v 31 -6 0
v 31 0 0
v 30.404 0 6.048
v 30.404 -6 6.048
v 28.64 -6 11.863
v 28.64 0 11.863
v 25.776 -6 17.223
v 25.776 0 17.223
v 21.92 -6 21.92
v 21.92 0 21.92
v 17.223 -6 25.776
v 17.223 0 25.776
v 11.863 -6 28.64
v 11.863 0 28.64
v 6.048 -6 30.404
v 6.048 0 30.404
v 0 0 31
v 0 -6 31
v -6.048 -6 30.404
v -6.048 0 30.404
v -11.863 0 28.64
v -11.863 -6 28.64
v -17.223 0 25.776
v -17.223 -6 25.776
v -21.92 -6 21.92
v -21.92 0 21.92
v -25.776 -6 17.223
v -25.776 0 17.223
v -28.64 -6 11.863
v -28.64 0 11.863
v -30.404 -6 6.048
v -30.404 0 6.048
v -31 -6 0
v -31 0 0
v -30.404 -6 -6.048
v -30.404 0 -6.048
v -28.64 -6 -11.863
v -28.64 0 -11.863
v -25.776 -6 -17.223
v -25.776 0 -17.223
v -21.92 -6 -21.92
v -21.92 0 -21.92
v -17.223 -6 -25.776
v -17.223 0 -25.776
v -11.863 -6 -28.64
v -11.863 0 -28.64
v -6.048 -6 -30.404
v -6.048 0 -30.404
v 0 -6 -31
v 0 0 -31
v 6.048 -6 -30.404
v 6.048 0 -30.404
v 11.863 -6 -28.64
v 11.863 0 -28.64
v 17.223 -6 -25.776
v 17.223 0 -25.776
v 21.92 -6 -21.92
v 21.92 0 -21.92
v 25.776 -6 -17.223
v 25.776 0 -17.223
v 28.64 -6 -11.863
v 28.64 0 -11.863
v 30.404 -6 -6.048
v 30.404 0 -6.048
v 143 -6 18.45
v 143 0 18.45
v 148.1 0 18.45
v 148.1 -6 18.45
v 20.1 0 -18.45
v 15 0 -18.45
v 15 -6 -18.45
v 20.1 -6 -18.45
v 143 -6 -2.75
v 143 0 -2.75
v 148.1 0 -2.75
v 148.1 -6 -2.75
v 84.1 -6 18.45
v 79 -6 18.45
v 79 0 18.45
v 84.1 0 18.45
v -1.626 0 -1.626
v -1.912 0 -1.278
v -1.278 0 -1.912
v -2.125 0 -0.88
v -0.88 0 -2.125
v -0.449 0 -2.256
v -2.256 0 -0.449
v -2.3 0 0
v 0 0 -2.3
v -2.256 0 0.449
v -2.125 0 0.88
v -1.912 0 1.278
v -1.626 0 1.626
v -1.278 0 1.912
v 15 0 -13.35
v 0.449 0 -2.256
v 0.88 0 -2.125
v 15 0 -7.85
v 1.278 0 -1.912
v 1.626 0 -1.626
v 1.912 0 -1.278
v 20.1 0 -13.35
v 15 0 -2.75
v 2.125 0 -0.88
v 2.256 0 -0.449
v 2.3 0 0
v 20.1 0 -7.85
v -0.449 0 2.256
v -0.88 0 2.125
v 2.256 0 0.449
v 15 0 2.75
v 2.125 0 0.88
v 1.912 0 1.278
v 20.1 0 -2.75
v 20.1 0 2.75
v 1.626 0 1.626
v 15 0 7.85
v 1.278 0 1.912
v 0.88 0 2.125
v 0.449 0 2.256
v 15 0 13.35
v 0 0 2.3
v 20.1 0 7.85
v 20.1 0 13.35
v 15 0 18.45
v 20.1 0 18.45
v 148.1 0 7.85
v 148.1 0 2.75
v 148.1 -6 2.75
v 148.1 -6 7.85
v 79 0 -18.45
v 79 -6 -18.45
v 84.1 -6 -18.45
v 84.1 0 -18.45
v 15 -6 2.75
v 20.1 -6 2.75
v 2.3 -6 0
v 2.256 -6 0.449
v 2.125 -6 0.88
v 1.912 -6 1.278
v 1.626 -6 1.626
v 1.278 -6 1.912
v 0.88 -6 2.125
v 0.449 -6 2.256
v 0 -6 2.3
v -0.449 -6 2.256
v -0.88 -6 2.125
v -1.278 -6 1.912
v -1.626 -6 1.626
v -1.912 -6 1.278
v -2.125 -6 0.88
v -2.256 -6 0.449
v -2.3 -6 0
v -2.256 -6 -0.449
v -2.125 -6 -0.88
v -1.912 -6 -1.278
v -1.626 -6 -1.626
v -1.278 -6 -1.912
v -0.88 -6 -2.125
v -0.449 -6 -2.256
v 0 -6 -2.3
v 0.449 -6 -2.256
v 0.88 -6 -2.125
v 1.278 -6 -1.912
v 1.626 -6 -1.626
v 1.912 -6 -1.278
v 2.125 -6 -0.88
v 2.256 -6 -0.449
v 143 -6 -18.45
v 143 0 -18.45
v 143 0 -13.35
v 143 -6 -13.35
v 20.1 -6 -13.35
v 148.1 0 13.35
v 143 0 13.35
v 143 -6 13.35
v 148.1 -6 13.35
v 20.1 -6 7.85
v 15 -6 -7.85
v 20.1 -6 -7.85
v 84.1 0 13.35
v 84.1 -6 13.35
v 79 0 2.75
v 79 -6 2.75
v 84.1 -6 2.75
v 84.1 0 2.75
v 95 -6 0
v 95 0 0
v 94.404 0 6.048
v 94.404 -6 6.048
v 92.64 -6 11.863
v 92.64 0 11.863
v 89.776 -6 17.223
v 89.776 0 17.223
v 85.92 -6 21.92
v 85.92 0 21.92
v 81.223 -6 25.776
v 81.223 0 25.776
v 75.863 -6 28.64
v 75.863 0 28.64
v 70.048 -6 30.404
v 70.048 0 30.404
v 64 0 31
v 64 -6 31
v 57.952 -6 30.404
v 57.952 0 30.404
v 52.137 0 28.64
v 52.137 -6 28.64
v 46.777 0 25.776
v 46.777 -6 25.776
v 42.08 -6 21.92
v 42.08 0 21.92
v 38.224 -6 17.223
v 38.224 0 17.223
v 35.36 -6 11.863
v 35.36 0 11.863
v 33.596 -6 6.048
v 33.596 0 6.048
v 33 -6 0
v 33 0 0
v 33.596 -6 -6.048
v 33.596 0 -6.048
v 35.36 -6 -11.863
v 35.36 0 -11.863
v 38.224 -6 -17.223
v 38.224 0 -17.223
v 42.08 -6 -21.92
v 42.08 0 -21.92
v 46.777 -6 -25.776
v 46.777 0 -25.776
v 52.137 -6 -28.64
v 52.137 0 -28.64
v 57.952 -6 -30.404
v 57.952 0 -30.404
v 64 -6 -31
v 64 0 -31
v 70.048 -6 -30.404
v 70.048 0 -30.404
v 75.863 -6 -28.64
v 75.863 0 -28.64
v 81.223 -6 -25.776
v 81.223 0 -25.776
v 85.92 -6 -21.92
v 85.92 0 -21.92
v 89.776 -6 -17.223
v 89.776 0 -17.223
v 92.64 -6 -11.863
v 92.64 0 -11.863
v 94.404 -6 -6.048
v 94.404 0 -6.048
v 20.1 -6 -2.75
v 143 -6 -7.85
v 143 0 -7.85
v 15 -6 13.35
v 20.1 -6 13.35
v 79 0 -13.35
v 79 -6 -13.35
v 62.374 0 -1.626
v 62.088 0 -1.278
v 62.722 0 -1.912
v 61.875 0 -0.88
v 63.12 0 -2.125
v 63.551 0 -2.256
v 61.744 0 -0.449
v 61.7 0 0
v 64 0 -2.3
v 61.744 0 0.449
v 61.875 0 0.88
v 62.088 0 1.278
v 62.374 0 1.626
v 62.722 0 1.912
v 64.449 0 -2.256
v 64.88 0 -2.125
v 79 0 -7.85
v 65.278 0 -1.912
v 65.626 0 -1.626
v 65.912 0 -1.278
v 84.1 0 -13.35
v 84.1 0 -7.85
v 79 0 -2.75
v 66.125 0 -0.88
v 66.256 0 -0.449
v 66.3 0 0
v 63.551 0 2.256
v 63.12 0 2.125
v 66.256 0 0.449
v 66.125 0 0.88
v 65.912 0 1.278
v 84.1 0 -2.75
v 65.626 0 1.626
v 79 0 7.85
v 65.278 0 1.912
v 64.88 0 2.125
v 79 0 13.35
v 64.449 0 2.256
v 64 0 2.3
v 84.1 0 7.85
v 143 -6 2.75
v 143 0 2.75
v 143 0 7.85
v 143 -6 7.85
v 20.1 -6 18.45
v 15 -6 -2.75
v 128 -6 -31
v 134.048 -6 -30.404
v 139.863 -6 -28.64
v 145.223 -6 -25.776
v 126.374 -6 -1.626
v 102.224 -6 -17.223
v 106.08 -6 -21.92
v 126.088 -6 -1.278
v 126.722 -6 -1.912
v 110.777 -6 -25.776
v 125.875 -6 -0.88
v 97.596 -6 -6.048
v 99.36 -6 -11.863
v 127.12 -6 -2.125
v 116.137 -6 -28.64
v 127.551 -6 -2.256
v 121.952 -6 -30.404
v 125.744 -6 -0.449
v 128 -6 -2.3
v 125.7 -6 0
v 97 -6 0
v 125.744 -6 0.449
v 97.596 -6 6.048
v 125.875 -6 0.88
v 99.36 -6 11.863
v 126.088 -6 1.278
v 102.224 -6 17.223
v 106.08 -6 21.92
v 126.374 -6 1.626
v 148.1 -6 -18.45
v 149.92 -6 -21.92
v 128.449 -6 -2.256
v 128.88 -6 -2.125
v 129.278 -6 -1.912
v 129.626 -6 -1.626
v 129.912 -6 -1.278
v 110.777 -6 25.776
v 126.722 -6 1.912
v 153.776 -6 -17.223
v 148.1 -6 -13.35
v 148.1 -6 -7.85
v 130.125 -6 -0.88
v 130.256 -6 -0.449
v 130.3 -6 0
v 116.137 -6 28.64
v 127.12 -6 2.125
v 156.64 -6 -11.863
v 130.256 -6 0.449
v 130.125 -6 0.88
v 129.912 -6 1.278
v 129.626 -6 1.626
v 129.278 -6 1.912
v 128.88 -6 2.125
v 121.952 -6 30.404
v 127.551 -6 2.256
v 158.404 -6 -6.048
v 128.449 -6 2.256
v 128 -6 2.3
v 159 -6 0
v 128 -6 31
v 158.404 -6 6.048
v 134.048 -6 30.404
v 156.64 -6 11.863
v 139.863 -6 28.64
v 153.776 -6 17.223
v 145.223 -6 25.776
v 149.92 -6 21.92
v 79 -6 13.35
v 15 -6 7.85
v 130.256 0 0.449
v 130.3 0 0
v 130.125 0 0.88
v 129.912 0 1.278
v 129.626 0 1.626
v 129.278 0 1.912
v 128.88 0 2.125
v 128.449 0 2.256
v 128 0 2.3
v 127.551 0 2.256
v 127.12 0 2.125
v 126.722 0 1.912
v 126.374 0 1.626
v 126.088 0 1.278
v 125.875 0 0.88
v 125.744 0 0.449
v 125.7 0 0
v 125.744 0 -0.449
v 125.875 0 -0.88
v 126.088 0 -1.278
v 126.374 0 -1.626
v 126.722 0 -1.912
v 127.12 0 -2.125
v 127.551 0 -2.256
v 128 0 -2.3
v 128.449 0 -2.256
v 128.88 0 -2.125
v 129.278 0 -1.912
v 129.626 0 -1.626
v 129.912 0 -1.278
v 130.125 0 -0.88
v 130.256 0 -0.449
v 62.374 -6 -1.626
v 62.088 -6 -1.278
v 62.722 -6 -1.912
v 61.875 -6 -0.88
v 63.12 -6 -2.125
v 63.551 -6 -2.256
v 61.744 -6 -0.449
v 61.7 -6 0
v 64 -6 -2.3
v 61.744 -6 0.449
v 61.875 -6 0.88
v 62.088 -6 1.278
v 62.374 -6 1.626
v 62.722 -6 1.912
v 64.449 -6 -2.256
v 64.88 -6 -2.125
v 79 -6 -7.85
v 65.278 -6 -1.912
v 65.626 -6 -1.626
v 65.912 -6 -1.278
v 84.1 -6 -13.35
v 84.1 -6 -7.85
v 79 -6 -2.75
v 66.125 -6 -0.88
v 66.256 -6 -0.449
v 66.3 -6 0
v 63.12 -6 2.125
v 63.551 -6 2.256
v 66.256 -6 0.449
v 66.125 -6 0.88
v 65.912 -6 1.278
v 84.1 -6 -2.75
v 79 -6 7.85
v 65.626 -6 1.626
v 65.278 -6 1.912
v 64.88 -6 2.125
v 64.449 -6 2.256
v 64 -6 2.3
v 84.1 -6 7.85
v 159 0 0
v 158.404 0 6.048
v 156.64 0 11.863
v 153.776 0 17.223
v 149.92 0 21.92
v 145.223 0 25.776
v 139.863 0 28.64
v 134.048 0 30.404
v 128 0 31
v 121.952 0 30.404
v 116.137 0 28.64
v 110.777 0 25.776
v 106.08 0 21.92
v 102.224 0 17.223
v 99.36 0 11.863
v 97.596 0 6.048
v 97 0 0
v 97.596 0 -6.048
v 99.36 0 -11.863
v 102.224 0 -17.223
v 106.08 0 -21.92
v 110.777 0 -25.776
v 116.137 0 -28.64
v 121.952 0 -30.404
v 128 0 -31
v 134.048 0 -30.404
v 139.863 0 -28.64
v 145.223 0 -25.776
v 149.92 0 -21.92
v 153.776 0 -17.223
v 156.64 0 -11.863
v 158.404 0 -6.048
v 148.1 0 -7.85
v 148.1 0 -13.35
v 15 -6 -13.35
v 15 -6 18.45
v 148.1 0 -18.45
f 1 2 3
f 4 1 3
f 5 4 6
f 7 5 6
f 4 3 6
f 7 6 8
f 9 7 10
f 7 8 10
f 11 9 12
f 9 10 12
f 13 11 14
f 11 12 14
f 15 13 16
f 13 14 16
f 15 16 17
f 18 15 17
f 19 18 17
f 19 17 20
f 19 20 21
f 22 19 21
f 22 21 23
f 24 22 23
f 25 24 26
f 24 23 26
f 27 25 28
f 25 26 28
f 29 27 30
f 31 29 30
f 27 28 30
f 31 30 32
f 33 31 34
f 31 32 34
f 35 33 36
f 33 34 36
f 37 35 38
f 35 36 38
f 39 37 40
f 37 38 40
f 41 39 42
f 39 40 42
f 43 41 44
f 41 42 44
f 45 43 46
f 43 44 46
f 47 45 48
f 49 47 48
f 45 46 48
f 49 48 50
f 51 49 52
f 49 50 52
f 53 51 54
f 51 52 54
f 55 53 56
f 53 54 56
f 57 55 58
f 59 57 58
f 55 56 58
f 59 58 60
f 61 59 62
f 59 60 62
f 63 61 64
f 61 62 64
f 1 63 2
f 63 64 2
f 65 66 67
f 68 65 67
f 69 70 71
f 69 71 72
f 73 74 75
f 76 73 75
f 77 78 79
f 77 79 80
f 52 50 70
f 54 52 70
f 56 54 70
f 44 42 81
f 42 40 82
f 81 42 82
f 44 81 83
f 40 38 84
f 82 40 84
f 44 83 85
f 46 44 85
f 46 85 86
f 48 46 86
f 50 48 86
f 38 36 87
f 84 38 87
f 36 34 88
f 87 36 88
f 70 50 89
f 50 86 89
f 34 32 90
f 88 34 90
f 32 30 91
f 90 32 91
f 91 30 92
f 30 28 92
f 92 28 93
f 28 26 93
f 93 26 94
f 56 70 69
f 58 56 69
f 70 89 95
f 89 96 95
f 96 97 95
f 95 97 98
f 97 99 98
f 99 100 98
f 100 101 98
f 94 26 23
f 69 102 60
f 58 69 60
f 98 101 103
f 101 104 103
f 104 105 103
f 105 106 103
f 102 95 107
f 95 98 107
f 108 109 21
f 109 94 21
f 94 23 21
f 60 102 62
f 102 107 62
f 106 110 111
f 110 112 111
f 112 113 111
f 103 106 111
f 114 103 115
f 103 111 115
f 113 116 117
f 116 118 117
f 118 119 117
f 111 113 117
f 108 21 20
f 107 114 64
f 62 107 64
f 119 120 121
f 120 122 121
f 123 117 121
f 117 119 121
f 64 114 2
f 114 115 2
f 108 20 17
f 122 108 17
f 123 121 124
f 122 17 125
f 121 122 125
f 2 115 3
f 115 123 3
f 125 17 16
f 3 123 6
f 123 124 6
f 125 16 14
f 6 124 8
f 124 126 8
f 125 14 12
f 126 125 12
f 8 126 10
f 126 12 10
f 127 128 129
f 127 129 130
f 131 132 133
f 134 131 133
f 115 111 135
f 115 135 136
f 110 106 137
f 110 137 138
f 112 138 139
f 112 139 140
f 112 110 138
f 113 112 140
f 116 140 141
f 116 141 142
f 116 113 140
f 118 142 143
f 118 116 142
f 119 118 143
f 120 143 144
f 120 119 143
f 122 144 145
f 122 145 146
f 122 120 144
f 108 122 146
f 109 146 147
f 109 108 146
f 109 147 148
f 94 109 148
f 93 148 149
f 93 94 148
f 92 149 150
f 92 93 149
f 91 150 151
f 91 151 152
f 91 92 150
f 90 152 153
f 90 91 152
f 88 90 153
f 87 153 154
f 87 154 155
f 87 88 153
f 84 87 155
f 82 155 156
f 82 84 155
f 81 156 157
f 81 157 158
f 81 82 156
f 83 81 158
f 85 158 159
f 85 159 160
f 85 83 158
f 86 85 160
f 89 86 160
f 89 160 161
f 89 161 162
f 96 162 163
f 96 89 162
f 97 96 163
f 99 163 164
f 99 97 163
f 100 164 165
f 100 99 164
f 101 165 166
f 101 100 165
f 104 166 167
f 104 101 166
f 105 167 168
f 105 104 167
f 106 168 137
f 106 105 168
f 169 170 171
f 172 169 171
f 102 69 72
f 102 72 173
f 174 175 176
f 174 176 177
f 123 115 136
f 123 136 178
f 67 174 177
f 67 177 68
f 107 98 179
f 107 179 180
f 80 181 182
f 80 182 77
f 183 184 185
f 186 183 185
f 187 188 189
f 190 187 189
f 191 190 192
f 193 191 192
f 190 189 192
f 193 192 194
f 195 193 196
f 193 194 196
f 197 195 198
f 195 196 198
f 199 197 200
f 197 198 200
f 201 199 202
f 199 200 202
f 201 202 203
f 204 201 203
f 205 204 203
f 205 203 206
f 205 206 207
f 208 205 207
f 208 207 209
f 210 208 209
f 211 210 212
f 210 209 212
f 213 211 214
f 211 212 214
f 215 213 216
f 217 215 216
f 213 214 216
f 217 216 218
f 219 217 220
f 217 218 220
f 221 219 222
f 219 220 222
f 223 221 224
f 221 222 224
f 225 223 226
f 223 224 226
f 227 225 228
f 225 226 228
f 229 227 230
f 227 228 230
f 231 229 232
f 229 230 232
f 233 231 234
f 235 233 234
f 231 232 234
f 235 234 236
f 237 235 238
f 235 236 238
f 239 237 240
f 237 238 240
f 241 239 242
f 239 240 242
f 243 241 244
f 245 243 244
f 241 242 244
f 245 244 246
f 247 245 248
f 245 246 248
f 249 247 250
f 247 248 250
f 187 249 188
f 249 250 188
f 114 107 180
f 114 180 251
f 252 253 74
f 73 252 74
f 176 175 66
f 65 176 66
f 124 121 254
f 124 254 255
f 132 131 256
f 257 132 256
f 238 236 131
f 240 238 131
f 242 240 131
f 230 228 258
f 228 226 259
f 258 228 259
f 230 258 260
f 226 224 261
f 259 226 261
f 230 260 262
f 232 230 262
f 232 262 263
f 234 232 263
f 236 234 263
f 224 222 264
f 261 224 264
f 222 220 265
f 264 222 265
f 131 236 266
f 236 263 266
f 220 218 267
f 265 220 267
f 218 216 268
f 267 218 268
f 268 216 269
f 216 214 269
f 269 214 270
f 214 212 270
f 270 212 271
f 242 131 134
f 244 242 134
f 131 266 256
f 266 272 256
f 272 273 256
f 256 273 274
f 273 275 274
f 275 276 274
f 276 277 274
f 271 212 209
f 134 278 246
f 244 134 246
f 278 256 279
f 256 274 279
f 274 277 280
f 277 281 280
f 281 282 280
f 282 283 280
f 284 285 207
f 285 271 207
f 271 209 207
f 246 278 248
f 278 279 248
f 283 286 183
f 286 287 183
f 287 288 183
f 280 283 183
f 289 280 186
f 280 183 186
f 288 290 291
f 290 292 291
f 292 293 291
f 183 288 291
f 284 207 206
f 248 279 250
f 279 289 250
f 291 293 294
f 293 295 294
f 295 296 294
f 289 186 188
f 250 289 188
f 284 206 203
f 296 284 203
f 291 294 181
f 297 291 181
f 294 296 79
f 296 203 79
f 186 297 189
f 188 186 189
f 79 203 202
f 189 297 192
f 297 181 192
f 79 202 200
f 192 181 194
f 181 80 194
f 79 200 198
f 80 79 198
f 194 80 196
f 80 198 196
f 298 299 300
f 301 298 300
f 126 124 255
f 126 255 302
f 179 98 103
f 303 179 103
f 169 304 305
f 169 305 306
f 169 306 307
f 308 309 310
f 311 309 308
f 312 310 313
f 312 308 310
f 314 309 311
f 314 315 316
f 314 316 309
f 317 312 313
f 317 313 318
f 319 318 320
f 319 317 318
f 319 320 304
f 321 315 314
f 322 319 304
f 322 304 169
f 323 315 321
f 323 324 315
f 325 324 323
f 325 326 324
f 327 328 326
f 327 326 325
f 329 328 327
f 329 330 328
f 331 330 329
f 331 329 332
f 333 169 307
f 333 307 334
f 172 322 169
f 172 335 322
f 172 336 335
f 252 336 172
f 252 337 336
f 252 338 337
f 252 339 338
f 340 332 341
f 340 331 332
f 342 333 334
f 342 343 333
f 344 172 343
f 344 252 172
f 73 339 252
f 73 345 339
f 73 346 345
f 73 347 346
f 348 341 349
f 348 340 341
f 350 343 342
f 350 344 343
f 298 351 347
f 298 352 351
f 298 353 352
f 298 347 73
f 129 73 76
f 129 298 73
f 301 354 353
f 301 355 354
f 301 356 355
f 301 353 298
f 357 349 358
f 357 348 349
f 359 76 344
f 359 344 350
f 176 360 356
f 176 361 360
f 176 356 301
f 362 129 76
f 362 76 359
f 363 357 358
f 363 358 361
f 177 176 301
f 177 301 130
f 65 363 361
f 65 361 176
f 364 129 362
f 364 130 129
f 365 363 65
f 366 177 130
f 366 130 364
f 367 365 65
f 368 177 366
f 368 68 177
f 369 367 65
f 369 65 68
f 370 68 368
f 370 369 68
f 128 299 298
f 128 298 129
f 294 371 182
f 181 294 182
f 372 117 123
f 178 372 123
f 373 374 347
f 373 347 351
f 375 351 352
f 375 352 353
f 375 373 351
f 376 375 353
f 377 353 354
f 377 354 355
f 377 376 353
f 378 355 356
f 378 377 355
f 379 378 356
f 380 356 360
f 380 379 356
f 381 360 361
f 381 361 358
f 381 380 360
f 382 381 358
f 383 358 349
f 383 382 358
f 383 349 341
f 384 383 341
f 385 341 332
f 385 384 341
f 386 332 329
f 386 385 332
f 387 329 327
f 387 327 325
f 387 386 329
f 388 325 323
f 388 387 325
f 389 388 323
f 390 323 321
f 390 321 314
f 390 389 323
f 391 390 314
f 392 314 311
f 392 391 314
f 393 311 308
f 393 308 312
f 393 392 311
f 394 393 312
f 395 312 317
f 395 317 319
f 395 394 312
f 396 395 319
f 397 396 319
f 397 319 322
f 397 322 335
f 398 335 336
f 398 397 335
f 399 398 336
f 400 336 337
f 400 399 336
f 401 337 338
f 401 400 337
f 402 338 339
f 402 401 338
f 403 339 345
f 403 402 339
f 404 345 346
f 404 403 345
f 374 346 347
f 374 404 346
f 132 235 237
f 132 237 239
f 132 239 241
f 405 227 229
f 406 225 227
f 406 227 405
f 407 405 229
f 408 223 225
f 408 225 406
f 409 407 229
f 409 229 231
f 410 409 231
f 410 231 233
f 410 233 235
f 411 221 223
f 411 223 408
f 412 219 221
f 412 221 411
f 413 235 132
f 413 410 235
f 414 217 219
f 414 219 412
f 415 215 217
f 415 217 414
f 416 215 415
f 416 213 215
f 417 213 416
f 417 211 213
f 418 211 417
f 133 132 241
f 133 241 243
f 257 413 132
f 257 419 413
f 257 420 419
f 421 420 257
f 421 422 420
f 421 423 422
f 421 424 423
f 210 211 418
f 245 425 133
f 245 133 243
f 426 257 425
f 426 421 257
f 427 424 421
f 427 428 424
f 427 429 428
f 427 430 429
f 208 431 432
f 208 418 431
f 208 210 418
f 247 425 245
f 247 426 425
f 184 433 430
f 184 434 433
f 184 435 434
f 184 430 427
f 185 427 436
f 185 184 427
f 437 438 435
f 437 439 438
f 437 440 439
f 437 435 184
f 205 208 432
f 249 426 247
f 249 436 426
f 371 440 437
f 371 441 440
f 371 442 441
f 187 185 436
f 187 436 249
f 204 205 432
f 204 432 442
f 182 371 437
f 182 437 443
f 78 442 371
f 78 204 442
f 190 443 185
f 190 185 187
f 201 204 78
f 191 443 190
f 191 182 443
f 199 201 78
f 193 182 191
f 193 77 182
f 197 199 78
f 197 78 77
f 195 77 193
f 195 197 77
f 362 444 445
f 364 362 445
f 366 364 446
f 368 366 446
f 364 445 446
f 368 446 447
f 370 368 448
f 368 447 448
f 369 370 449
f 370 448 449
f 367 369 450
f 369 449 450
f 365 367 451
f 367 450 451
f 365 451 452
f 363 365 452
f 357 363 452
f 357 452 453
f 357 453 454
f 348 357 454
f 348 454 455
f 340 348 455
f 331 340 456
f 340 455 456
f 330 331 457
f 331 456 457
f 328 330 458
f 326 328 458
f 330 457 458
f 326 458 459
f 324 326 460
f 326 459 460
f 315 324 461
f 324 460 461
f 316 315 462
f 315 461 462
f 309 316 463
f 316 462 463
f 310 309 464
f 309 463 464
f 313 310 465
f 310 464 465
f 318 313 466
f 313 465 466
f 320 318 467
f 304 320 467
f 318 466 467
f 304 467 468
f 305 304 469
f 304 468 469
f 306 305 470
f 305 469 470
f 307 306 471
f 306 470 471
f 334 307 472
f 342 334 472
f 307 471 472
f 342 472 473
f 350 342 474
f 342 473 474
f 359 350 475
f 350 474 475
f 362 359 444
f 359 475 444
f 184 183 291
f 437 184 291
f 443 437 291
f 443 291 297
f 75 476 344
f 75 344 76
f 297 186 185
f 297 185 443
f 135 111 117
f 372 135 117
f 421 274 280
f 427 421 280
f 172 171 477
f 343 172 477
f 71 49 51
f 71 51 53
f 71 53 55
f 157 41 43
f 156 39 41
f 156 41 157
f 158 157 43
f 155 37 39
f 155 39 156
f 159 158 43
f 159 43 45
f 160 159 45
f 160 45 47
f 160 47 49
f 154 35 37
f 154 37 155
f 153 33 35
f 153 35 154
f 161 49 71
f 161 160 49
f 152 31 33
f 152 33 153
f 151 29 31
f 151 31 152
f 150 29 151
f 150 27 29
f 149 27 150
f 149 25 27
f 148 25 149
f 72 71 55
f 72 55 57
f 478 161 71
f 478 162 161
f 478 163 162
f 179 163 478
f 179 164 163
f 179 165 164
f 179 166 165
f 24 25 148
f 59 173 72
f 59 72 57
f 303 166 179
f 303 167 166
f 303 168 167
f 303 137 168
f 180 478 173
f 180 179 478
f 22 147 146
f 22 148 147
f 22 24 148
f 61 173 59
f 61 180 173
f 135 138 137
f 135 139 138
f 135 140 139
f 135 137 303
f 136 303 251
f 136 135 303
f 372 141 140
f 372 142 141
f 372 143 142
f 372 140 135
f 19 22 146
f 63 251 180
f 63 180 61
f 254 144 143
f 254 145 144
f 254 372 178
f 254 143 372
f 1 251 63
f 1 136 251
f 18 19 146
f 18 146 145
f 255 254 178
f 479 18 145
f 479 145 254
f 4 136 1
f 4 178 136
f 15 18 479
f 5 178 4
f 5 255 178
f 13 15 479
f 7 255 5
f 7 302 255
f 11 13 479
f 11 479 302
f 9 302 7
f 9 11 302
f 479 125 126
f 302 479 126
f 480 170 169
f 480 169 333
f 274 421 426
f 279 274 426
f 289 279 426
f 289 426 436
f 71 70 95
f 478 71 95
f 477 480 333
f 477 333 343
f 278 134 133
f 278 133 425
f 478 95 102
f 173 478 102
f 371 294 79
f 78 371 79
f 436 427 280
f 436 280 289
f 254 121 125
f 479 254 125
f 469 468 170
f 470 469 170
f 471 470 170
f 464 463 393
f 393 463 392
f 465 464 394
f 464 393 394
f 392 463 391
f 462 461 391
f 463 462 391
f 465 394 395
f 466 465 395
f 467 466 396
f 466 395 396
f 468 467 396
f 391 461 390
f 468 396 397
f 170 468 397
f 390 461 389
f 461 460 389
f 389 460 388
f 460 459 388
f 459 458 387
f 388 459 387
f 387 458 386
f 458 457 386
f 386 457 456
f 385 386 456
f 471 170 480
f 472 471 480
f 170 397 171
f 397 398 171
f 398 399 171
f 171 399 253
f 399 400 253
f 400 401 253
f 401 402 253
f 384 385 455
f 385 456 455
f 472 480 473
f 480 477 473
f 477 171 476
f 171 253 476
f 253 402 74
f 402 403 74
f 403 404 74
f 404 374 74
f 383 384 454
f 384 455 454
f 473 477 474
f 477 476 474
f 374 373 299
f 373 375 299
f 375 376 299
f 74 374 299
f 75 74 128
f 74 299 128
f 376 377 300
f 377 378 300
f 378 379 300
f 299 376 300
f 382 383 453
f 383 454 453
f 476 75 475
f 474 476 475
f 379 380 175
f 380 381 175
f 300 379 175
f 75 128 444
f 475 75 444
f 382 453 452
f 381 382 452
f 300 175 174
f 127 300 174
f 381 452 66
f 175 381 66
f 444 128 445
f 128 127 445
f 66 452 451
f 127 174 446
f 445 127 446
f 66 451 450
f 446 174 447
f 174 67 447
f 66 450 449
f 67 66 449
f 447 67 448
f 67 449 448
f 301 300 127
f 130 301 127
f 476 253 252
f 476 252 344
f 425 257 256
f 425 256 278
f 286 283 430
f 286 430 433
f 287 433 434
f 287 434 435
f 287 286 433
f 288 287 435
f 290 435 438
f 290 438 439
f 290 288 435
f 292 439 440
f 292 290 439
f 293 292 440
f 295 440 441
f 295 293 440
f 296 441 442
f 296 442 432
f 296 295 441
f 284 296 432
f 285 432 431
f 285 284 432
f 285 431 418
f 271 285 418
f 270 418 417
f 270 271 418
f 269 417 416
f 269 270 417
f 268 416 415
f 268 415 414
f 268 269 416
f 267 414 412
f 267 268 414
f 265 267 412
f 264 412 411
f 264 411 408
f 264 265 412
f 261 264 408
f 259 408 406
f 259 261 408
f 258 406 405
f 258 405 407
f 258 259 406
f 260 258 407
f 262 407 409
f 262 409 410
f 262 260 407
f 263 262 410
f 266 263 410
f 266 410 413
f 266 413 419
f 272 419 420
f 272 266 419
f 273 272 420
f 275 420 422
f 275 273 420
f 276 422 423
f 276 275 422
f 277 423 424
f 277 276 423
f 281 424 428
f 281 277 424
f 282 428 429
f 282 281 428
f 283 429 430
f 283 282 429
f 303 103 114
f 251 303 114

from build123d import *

# Parameters (mm, degrees)
F0_R     = 31
F0_W     = 5.1
F0_H     = 5.1
F0_R_2   = 2.3
F1_DEPTH = 6


with BuildPart() as f1:
    # F0 (on Front) → F1 (new body)
    with BuildSketch(Plane.XZ):
        Circle(F0_R)
        with Locations((17.55, -15.9)):
            Rectangle(F0_W, F0_H, mode=Mode.SUBTRACT)
        with Locations((17.55, -5.3)):
            Rectangle(F0_W, F0_H, mode=Mode.SUBTRACT)
        Circle(F0_R_2, mode=Mode.SUBTRACT)
        with Locations((17.55, 5.3)):
            Rectangle(F0_W, F0_H, mode=Mode.SUBTRACT)
        with Locations((17.55, 15.9)):
            Rectangle(F0_W, F0_H, mode=Mode.SUBTRACT)
        with Locations((64, 0)):
            Circle(F0_R)
        with Locations((81.55, -15.9)):
            Rectangle(F0_W, F0_H, mode=Mode.SUBTRACT)
        with Locations((81.55, -5.3)):
            Rectangle(F0_W, F0_H, mode=Mode.SUBTRACT)
        with Locations((64, 0)):
            Circle(F0_R_2, mode=Mode.SUBTRACT)
        with Locations((81.55, 5.3)):
            Rectangle(F0_W, F0_H, mode=Mode.SUBTRACT)
        with Locations((81.55, 15.9)):
            Rectangle(F0_W, F0_H, mode=Mode.SUBTRACT)
        with Locations((128, 0)):
            Circle(F0_R)
        with Locations((145.55, -15.9)):
            Rectangle(F0_W, F0_H, mode=Mode.SUBTRACT)
        with Locations((145.55, -5.3)):
            Rectangle(F0_W, F0_H, mode=Mode.SUBTRACT)
        with Locations((128, 0)):
            Circle(F0_R_2, mode=Mode.SUBTRACT)
        with Locations((145.55, 5.3)):
            Rectangle(F0_W, F0_H, mode=Mode.SUBTRACT)
        with Locations((145.55, 15.9)):
            Rectangle(F0_W, F0_H, mode=Mode.SUBTRACT)
    extrude(amount=F1_DEPTH)


solid = f1.part
